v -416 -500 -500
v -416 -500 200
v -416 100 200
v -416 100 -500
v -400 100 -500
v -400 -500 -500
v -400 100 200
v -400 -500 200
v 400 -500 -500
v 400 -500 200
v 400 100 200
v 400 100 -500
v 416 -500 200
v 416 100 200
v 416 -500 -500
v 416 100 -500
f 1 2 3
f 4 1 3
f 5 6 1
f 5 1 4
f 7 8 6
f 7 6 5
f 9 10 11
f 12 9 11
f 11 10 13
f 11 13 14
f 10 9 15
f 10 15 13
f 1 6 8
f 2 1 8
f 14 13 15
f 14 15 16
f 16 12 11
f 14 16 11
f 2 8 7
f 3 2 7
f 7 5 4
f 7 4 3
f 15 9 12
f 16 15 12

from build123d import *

# Parameters (mm, degrees)
F3_W     = 600
F3_H     = 700
F4_DEPTH = 16


with BuildPart() as f4:
    # F3 (on offset) → F4 (new body)
    with BuildSketch(Plane.YZ.offset(-400)):
        with Locations((-200, -150)):
            Rectangle(F3_W, F3_H)
    extrude(amount=-F4_DEPTH)


with BuildPart() as f5_1:
    # F5: instance of F4
    add(f4.part.mirror(Plane.YZ))


solid = Compound([f4.part, f5_1.part])
